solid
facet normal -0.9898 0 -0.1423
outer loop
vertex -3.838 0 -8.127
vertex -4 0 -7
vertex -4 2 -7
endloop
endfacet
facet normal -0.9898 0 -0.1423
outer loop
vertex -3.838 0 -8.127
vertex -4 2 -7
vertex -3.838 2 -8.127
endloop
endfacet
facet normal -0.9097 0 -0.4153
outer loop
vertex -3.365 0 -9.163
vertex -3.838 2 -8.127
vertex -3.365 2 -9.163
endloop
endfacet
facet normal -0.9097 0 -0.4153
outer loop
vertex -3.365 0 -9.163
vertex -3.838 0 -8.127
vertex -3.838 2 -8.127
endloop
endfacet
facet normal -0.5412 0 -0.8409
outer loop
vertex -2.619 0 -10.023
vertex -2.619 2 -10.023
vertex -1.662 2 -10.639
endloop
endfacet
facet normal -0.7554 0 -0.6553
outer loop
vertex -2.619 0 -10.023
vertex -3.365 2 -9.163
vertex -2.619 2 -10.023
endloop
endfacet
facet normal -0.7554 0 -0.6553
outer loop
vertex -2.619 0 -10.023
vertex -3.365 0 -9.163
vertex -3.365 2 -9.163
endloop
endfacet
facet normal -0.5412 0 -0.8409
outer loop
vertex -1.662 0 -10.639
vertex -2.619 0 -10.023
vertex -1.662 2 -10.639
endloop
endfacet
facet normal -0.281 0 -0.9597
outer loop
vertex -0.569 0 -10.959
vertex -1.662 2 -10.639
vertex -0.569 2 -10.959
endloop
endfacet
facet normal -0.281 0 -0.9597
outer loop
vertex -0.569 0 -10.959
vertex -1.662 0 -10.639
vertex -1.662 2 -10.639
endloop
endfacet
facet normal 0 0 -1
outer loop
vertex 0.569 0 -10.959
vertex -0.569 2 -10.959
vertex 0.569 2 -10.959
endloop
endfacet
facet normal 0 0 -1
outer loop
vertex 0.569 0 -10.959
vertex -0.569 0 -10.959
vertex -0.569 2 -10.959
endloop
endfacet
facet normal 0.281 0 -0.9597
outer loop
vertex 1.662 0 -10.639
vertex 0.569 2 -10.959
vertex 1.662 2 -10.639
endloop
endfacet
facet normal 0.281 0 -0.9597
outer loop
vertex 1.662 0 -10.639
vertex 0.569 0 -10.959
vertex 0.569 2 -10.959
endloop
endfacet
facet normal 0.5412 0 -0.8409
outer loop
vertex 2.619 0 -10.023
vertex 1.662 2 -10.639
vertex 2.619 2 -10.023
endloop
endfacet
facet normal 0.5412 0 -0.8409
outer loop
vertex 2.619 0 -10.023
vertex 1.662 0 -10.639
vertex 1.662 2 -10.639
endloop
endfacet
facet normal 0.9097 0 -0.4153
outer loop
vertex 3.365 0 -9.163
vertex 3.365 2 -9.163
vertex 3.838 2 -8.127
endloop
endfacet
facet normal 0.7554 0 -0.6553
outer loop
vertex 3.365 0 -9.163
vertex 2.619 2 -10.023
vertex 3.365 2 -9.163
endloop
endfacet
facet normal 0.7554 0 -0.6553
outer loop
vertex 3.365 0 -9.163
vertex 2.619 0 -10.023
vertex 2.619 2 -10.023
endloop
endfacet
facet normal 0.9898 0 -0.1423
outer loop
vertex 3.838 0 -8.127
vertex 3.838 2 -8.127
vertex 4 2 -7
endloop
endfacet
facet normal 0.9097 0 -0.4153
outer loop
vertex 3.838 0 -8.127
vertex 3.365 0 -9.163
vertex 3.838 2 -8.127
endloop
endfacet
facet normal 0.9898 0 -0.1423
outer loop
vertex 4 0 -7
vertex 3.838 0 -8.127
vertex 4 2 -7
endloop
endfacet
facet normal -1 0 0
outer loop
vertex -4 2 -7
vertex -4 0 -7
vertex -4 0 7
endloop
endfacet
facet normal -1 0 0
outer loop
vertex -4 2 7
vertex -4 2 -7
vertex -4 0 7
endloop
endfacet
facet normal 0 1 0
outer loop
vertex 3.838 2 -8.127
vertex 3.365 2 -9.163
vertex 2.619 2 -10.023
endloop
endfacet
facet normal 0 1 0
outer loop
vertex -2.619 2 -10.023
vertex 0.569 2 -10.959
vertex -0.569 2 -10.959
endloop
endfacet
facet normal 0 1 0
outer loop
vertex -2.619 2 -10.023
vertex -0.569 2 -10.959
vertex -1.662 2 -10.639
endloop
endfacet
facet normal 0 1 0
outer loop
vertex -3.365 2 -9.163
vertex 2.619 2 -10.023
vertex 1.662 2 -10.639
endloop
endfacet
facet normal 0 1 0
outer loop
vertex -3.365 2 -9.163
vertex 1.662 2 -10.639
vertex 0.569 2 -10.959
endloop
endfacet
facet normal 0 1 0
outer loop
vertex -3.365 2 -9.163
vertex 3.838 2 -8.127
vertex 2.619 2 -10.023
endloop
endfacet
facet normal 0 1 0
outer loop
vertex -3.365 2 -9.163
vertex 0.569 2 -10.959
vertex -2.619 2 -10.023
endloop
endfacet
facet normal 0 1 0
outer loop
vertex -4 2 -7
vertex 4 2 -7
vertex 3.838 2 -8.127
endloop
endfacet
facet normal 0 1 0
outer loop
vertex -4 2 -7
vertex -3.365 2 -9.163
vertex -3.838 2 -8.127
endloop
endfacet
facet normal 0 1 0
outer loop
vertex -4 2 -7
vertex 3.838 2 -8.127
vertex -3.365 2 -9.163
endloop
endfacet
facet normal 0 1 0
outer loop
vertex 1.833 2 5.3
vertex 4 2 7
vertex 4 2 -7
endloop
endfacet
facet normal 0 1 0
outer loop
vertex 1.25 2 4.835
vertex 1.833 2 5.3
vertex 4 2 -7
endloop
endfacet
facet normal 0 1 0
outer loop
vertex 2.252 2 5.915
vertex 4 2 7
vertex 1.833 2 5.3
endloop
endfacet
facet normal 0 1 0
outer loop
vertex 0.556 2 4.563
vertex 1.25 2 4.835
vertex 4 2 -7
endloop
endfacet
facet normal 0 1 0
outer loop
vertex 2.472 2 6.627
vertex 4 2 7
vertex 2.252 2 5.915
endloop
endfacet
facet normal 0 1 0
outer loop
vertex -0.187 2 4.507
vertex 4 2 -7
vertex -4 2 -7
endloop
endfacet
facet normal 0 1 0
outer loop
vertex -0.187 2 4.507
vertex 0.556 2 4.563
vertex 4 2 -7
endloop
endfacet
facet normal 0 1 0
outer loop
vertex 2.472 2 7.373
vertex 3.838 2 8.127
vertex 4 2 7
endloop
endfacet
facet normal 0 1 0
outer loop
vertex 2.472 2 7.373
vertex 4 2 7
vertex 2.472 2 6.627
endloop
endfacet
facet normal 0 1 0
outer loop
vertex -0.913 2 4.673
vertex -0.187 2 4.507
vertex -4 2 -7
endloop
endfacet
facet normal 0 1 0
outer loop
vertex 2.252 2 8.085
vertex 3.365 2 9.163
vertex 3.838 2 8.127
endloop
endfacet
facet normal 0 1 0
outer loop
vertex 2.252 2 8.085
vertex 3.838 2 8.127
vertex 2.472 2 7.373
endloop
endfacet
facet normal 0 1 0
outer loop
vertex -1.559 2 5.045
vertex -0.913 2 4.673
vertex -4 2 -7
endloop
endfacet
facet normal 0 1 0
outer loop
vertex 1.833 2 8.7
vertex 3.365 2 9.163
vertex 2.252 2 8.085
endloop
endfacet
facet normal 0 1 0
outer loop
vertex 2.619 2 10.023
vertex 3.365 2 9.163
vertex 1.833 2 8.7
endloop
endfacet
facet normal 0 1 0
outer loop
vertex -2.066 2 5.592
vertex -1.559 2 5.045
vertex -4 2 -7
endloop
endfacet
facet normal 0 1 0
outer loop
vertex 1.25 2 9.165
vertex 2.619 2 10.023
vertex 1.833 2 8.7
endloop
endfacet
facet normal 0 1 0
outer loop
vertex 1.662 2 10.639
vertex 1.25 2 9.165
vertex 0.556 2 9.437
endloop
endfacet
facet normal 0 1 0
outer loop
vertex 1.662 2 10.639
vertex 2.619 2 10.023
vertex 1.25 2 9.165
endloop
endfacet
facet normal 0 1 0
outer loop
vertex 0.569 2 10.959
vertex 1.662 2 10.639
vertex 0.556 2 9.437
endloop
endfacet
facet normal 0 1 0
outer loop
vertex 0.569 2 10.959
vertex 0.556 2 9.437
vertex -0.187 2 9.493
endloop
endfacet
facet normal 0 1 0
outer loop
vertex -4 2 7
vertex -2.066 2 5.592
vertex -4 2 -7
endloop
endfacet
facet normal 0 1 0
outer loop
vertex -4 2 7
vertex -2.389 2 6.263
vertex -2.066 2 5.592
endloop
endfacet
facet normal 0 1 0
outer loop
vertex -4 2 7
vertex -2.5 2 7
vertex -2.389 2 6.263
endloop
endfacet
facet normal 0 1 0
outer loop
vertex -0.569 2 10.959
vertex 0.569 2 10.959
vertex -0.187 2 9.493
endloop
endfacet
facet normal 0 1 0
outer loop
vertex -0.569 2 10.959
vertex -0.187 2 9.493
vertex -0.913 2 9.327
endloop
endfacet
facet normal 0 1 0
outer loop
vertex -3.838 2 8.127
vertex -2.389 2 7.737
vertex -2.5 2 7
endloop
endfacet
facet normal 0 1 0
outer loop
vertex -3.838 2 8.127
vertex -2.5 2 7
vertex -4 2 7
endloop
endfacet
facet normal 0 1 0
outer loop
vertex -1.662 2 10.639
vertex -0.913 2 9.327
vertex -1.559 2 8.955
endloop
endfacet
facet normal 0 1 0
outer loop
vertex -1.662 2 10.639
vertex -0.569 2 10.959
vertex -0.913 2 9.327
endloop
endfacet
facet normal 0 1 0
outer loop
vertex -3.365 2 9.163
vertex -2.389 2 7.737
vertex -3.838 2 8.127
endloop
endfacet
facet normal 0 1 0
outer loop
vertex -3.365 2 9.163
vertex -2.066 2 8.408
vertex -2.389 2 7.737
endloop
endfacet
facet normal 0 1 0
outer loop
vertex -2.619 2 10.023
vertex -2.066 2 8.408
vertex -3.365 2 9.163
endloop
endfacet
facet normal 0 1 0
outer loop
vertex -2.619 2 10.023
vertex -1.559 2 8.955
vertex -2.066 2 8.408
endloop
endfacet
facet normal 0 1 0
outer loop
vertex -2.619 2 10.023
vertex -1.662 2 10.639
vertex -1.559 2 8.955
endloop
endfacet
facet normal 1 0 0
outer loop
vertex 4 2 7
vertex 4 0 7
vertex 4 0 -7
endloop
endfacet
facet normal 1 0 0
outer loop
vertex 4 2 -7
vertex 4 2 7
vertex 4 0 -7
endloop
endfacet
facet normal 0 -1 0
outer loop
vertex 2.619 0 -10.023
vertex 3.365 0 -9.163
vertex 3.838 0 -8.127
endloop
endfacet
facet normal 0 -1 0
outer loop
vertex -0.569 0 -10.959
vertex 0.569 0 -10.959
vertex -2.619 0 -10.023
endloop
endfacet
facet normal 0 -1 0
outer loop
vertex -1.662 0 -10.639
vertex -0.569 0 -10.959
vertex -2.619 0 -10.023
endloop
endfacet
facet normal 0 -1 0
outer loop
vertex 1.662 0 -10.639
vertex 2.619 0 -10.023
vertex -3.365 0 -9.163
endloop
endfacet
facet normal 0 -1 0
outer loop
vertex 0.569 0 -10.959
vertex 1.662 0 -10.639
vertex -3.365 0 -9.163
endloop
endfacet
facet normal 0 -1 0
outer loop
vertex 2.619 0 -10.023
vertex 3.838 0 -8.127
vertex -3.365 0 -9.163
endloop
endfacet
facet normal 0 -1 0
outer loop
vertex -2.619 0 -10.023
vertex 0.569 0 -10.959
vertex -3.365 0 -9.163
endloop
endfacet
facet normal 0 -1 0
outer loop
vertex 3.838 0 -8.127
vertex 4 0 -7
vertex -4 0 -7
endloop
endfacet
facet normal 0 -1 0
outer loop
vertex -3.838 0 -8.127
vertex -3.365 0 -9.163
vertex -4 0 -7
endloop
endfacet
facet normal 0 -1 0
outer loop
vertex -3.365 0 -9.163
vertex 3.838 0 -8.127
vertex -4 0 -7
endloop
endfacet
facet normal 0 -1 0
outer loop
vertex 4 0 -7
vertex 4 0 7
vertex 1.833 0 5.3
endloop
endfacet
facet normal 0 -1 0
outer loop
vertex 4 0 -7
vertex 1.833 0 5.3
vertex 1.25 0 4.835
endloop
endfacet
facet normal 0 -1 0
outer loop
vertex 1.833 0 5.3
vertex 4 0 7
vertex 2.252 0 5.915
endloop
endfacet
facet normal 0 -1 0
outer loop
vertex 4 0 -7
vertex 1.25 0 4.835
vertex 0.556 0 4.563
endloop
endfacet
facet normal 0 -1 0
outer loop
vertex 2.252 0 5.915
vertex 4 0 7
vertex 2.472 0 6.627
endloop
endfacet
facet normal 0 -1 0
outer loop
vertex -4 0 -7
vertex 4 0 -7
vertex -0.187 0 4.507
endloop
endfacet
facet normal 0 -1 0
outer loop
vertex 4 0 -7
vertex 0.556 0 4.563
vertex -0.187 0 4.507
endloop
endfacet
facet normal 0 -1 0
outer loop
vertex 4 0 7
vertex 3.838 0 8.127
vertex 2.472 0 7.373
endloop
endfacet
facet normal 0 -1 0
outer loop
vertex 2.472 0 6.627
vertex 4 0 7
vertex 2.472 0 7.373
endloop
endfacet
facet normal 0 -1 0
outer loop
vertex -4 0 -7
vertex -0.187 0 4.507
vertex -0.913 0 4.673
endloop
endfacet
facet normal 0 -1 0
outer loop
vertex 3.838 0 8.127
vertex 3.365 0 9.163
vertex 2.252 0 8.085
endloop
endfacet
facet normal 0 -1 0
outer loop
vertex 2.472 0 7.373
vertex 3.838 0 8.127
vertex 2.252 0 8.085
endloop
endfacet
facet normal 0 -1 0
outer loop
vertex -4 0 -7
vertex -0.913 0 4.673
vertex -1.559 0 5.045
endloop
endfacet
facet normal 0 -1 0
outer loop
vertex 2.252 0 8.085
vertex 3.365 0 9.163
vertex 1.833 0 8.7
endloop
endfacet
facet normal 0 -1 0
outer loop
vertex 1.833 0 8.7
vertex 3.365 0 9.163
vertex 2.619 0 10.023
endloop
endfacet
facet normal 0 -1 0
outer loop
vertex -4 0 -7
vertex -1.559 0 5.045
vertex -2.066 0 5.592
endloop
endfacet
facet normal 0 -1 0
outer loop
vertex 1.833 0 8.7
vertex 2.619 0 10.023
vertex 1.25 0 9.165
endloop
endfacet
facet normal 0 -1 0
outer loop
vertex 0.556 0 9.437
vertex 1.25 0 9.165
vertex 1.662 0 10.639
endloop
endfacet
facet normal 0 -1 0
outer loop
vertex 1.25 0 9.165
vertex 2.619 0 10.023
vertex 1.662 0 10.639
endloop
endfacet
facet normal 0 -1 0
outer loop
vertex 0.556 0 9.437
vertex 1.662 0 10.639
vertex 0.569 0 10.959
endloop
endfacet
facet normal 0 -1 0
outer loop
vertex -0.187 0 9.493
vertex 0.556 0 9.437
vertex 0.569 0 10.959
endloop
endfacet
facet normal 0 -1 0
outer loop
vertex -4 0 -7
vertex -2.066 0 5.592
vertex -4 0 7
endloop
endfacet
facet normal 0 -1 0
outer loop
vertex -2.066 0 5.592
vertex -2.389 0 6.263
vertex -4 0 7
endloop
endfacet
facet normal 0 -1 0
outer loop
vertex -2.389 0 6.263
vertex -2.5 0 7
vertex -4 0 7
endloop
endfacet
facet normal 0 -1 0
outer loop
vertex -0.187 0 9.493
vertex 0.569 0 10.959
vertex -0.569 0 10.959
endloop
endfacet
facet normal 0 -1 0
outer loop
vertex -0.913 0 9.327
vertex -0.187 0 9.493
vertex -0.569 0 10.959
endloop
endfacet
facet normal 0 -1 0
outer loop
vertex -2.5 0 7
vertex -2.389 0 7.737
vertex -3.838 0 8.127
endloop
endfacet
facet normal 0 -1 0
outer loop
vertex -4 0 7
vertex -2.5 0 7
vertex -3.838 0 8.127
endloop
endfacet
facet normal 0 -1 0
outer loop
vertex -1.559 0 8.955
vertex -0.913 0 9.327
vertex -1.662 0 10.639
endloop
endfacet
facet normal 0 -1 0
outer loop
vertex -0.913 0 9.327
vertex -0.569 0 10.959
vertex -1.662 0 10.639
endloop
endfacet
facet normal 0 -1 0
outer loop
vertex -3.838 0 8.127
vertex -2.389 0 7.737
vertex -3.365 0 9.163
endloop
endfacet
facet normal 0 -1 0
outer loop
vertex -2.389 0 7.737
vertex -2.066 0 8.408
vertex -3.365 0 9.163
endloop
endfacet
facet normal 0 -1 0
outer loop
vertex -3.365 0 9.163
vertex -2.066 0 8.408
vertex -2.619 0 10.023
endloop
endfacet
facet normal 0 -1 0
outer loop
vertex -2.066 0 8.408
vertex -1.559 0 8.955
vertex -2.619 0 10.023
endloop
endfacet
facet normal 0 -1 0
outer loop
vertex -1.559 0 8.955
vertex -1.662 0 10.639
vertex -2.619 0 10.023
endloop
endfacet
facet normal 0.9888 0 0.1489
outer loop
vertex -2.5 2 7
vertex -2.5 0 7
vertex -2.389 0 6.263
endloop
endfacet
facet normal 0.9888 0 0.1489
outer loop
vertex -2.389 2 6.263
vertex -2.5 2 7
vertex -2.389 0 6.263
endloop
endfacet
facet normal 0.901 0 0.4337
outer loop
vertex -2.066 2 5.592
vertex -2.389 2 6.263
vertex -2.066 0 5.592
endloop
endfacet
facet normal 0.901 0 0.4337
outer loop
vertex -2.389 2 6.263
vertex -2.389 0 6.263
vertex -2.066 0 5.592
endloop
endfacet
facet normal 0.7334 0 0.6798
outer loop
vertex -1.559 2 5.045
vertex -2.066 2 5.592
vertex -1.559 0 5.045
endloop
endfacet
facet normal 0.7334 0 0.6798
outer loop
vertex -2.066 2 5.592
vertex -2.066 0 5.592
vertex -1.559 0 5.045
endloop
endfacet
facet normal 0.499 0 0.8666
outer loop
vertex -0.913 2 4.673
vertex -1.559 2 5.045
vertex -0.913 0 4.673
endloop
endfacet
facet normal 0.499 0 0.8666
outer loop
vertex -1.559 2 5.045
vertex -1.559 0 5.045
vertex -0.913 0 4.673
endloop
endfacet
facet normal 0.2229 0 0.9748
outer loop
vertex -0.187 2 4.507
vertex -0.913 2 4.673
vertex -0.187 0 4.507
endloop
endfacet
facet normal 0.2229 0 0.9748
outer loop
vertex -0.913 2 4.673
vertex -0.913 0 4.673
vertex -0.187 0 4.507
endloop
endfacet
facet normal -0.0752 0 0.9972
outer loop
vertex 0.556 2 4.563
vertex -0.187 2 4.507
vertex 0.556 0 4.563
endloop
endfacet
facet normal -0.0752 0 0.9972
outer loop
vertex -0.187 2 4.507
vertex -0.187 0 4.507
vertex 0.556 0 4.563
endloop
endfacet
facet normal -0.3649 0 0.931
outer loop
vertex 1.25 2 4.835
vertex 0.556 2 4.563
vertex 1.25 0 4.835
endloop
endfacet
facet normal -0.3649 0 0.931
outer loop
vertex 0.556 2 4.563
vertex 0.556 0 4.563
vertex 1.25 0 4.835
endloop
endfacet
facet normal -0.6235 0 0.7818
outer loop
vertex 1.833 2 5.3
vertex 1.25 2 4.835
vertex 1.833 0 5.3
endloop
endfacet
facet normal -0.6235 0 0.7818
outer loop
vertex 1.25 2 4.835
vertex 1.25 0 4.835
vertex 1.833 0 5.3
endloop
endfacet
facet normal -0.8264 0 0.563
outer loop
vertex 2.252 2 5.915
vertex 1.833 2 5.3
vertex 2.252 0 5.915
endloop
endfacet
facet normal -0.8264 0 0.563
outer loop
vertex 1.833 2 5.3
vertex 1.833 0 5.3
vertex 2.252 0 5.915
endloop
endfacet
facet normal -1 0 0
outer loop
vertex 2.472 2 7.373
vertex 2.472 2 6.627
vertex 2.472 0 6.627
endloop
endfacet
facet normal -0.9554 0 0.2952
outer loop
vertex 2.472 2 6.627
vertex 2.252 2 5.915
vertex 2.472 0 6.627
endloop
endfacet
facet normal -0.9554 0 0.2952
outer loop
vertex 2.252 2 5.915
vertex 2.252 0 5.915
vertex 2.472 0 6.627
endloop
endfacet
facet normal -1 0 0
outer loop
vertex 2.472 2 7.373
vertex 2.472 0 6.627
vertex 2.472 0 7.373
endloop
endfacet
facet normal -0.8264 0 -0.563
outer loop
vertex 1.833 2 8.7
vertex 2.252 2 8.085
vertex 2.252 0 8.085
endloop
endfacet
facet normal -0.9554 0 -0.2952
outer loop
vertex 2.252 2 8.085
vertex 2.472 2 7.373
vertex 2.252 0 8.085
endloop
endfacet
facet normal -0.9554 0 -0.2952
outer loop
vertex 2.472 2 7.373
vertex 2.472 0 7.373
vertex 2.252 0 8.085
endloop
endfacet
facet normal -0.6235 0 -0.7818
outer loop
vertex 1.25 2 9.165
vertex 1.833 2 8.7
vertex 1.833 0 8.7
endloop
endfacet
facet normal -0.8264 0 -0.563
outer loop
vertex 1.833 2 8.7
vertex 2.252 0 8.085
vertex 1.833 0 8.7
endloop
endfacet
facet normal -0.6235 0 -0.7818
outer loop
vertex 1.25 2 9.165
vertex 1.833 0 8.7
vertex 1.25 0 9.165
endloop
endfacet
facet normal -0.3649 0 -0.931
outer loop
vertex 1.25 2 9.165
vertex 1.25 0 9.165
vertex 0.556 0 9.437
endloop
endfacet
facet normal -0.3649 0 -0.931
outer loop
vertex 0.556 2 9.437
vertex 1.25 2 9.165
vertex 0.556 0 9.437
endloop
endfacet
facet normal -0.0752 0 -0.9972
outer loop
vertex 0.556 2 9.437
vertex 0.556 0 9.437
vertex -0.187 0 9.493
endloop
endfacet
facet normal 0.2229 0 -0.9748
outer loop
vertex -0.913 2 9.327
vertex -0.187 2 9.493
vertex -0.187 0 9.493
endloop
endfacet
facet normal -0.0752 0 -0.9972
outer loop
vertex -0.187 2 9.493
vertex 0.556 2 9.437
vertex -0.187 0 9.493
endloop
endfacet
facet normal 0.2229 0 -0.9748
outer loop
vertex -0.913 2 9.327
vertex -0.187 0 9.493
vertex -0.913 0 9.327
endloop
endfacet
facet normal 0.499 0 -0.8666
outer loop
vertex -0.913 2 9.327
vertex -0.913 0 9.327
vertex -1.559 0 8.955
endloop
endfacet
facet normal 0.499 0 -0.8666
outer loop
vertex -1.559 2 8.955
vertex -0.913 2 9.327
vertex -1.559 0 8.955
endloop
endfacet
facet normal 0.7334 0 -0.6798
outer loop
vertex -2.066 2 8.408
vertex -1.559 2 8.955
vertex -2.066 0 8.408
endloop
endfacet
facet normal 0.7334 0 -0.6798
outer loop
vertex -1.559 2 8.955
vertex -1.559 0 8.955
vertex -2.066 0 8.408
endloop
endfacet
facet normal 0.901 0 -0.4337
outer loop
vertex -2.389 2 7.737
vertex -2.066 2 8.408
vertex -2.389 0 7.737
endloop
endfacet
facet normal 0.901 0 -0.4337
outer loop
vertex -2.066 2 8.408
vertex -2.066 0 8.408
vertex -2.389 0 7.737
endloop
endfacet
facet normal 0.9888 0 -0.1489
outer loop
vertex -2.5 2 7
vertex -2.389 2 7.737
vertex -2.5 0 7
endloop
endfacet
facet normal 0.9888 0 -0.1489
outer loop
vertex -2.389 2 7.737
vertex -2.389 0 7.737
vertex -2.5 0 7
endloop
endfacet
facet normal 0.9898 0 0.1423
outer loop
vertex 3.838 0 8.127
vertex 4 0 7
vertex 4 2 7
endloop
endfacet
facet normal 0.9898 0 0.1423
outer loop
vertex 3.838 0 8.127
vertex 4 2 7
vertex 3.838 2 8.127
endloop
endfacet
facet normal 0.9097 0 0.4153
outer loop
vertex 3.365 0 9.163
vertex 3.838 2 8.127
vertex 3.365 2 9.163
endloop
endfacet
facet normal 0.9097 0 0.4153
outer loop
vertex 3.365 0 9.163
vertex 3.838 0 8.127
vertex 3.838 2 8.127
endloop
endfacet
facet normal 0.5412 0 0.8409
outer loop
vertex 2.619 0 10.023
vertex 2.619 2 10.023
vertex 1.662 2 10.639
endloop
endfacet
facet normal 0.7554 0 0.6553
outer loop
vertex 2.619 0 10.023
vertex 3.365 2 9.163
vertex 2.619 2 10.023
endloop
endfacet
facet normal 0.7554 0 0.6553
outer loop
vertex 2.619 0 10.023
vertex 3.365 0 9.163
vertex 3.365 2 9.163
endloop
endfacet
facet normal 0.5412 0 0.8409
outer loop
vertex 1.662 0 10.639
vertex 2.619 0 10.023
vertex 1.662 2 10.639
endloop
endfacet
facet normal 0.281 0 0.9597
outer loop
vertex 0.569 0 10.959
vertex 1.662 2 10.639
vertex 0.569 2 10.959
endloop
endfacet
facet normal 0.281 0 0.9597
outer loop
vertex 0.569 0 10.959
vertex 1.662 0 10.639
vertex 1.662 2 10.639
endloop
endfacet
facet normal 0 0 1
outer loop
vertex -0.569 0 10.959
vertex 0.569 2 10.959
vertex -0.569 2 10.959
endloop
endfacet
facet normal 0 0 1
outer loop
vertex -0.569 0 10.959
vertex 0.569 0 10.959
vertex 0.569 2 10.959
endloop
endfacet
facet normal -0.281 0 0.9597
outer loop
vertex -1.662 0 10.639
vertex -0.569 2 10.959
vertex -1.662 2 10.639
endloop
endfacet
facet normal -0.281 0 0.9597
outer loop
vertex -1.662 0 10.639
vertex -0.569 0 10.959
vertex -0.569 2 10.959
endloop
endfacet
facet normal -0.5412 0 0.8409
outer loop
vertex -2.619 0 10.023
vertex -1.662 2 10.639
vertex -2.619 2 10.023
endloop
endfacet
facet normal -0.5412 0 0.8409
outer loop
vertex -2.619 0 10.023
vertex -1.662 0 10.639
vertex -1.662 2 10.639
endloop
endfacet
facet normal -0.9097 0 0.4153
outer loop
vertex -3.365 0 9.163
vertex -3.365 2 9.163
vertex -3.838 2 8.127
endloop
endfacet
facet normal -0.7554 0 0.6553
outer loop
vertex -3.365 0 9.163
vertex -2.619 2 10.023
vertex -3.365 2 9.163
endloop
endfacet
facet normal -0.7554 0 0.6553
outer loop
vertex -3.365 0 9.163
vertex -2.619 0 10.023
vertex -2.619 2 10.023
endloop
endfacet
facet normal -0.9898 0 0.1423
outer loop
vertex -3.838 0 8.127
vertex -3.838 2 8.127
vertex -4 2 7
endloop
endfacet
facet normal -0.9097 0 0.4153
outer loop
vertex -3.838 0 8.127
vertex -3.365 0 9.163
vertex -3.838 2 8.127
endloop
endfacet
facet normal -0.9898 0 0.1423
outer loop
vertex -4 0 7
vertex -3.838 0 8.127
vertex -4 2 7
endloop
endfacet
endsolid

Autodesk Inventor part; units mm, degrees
ref_plane "YZ Plane" through (0, 0, 0) normal (1, 0, 0) x (0, 1, 0)
ref_plane "XZ Plane" through (0, 0, 0) normal (0, 1, 0) x (-1, 0, 0)
ref_plane "XY Plane" through (0, 0, 0) normal (0, 0, 1) x (1, 0, 0)
sketch "Sketch1" plane through (0, 0, 0) normal (0, 1, 0) x (-1, 0, 0)
  line L0 (0, 7) -> (0, -7) construction
  line L1 (-4, 7) -> (-4, -7)
  line L2 (4, -7) -> (4, 7)
  arc A0 (4, 7) -> (-4, 7) centre (0, 7) ccw
  arc A1 (-4, -7) -> (4, -7) centre (0, -7) ccw
  circle A2 centre (0, 7) radius 2.5
  point P0 (0, 0)
  point P1 (0, 0)
  point P2 (0, -11)
  dimension "d0" = 8
  dimension "d1" = 18
  dimension "d2" = 5
extrude "Extrusion1" add sketch "Sketch1" along normal blind 2
properties part number "servo-arm"
